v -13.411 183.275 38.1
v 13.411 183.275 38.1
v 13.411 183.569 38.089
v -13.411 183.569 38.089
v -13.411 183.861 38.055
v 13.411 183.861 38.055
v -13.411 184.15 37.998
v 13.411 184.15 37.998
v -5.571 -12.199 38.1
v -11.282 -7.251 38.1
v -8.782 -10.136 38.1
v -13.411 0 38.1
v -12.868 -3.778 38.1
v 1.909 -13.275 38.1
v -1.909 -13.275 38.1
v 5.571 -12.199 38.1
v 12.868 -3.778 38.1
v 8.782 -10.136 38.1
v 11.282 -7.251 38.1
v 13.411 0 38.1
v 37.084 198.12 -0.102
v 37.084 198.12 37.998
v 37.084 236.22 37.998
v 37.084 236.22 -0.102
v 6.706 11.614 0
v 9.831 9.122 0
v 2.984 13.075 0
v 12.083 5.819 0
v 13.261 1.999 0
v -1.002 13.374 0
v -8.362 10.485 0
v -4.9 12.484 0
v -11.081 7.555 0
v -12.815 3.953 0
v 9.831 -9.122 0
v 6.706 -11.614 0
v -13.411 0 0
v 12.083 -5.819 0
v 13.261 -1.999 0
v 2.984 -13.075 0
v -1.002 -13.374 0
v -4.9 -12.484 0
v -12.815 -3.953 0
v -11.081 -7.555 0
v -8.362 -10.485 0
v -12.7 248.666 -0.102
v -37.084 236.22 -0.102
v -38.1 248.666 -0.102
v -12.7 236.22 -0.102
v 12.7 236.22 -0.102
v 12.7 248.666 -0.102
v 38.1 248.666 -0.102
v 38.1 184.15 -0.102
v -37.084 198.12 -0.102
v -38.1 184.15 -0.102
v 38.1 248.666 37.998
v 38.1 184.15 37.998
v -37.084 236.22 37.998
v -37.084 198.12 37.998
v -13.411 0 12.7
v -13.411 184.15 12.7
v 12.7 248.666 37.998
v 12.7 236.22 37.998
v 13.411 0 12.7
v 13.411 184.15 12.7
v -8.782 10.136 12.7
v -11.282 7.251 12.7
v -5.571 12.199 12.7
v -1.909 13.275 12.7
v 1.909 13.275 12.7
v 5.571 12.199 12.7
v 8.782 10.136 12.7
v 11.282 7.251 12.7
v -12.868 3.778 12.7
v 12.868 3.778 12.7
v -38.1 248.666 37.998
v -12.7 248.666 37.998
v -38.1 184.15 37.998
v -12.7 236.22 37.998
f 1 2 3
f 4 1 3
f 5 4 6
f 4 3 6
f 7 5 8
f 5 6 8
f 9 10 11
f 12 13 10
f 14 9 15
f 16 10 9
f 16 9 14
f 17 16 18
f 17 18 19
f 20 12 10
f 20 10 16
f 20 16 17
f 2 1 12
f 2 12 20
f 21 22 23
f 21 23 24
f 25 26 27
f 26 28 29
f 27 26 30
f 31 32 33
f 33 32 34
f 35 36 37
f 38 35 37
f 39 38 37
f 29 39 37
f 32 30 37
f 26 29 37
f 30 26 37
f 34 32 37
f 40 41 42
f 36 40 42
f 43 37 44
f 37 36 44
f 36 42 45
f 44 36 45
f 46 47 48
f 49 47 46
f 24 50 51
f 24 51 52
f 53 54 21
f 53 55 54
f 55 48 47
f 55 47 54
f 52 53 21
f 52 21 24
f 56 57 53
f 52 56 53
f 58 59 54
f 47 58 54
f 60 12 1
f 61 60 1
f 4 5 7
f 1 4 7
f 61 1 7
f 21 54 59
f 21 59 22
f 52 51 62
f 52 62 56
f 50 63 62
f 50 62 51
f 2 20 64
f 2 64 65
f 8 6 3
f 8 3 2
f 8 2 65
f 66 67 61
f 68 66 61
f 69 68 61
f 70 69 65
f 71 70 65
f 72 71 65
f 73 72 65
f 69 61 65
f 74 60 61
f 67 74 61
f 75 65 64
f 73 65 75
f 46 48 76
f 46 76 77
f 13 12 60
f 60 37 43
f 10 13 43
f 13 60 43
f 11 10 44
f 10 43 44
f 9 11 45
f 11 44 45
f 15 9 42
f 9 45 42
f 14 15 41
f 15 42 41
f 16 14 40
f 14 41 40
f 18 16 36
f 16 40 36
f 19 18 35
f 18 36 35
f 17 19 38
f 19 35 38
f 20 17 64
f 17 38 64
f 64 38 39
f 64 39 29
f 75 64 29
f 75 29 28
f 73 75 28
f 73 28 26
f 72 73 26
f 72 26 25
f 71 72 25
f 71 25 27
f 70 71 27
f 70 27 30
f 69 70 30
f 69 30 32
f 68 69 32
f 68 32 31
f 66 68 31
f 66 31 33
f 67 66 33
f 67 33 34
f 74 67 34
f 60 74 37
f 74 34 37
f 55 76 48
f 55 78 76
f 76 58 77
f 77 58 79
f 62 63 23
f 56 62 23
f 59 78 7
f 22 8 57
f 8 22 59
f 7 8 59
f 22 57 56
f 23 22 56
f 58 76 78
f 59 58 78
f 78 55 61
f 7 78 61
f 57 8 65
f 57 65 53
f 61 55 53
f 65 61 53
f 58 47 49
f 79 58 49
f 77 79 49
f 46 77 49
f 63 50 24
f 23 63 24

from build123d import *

# Parameters (mm, degrees)
SKETCH2_R           = 13.4112
BOSS_EXTRUDE1_DEPTH = 38.1
SKETCH5_W           = 26.8224
SKETCH5_H           = 184.15
BOSS_EXTRUDE2_DEPTH = 25.4
SKETCH8_W           = 76.2
SKETCH8_H           = 38.1
BOSS_EXTRUDE3_DEPTH = 13.97
SKETCH9_W           = 1.016
SKETCH9_H           = 38.1
BOSS_EXTRUDE4_DEPTH = 38.1
SKETCH10_W          = 25.4
SKETCH10_H          = 38.1
BOSS_EXTRUDE5_DEPTH = 12.446
FILLET1_R           = 3.81


with BuildPart() as part:
    # Sketch2 → Boss-Extrude1 (new body)
    with BuildSketch(Plane.XY):
        with Locations(Location((0, 0, 0), (0, 0, 180))):
            Circle(SKETCH2_R)
    extrude(amount=BOSS_EXTRUDE1_DEPTH)

    # Sketch5 → Boss-Extrude2 (add)
    with BuildSketch(Plane.XY.offset(38.1)):
        with Locations((0, 92.075)):
            Rectangle(SKETCH5_W, SKETCH5_H)
    extrude(amount=-BOSS_EXTRUDE2_DEPTH)

    # Sketch8 → Boss-Extrude3 (add)
    with BuildSketch(Plane(origin=(0, 184.15, 0), x_dir=(1, 0, 0), z_dir=(0, 1, 0))):
        with Locations((0, -18.948214994)):
            Rectangle(SKETCH8_W, SKETCH8_H)
    extrude(amount=BOSS_EXTRUDE3_DEPTH)

    # Sketch9 → Boss-Extrude4 (add)
    with BuildSketch(Plane(origin=(0, 198.12, 0), x_dir=(1, 0, 0), z_dir=(0, 1, 0))):
        with Locations((-37.592, -18.948214994)):
            Rectangle(SKETCH9_W, SKETCH9_H)
        with Locations((37.592, -18.948214994)):
            Rectangle(SKETCH9_W, SKETCH9_H)
    extrude(amount=BOSS_EXTRUDE4_DEPTH)

    # Sketch10 → Boss-Extrude5 (add)
    with BuildSketch(Plane(origin=(0, 236.22, 0), x_dir=(1, 0, 0), z_dir=(0, 1, 0))):
        with Locations((-25.4, -18.948214994)):
            Rectangle(SKETCH10_W, SKETCH10_H)
        with Locations((25.4, -18.948214994)):
            Rectangle(SKETCH10_W, SKETCH10_H)
    extrude(amount=BOSS_EXTRUDE5_DEPTH)

    # Fillet1
    # the kernel refuses this fillet: 3.81 mm, written as the material it takes off along each edge
    with BuildSketch(Plane(origin=(15.598152153, 184.15, 38.1), x_dir=(0, 0, -1), z_dir=(-1, 0, 0))) as fillet1_piece_1:
        with BuildLine():
            CenterArc((3.81, 0.874780861), FILLET1_R, 180, 13.273598337)
            Line((0, 0.874780861), (-0.0762, 0.874780861))
            Line((-0.0762, 0.874780861), (-0.0762, 0))
            Line((-0.0762, 0), (0, -0.0762))
            ThreePointArc((0, -0.0762), (0.050892503, -0.0762), (0.027620706, -0.017495617))
            Line((0.027620706, -0.017495617), (0.101785006, 0))
        make_face()
    extrude(amount=31.196304306, mode=Mode.SUBTRACT)


solid = part.part
